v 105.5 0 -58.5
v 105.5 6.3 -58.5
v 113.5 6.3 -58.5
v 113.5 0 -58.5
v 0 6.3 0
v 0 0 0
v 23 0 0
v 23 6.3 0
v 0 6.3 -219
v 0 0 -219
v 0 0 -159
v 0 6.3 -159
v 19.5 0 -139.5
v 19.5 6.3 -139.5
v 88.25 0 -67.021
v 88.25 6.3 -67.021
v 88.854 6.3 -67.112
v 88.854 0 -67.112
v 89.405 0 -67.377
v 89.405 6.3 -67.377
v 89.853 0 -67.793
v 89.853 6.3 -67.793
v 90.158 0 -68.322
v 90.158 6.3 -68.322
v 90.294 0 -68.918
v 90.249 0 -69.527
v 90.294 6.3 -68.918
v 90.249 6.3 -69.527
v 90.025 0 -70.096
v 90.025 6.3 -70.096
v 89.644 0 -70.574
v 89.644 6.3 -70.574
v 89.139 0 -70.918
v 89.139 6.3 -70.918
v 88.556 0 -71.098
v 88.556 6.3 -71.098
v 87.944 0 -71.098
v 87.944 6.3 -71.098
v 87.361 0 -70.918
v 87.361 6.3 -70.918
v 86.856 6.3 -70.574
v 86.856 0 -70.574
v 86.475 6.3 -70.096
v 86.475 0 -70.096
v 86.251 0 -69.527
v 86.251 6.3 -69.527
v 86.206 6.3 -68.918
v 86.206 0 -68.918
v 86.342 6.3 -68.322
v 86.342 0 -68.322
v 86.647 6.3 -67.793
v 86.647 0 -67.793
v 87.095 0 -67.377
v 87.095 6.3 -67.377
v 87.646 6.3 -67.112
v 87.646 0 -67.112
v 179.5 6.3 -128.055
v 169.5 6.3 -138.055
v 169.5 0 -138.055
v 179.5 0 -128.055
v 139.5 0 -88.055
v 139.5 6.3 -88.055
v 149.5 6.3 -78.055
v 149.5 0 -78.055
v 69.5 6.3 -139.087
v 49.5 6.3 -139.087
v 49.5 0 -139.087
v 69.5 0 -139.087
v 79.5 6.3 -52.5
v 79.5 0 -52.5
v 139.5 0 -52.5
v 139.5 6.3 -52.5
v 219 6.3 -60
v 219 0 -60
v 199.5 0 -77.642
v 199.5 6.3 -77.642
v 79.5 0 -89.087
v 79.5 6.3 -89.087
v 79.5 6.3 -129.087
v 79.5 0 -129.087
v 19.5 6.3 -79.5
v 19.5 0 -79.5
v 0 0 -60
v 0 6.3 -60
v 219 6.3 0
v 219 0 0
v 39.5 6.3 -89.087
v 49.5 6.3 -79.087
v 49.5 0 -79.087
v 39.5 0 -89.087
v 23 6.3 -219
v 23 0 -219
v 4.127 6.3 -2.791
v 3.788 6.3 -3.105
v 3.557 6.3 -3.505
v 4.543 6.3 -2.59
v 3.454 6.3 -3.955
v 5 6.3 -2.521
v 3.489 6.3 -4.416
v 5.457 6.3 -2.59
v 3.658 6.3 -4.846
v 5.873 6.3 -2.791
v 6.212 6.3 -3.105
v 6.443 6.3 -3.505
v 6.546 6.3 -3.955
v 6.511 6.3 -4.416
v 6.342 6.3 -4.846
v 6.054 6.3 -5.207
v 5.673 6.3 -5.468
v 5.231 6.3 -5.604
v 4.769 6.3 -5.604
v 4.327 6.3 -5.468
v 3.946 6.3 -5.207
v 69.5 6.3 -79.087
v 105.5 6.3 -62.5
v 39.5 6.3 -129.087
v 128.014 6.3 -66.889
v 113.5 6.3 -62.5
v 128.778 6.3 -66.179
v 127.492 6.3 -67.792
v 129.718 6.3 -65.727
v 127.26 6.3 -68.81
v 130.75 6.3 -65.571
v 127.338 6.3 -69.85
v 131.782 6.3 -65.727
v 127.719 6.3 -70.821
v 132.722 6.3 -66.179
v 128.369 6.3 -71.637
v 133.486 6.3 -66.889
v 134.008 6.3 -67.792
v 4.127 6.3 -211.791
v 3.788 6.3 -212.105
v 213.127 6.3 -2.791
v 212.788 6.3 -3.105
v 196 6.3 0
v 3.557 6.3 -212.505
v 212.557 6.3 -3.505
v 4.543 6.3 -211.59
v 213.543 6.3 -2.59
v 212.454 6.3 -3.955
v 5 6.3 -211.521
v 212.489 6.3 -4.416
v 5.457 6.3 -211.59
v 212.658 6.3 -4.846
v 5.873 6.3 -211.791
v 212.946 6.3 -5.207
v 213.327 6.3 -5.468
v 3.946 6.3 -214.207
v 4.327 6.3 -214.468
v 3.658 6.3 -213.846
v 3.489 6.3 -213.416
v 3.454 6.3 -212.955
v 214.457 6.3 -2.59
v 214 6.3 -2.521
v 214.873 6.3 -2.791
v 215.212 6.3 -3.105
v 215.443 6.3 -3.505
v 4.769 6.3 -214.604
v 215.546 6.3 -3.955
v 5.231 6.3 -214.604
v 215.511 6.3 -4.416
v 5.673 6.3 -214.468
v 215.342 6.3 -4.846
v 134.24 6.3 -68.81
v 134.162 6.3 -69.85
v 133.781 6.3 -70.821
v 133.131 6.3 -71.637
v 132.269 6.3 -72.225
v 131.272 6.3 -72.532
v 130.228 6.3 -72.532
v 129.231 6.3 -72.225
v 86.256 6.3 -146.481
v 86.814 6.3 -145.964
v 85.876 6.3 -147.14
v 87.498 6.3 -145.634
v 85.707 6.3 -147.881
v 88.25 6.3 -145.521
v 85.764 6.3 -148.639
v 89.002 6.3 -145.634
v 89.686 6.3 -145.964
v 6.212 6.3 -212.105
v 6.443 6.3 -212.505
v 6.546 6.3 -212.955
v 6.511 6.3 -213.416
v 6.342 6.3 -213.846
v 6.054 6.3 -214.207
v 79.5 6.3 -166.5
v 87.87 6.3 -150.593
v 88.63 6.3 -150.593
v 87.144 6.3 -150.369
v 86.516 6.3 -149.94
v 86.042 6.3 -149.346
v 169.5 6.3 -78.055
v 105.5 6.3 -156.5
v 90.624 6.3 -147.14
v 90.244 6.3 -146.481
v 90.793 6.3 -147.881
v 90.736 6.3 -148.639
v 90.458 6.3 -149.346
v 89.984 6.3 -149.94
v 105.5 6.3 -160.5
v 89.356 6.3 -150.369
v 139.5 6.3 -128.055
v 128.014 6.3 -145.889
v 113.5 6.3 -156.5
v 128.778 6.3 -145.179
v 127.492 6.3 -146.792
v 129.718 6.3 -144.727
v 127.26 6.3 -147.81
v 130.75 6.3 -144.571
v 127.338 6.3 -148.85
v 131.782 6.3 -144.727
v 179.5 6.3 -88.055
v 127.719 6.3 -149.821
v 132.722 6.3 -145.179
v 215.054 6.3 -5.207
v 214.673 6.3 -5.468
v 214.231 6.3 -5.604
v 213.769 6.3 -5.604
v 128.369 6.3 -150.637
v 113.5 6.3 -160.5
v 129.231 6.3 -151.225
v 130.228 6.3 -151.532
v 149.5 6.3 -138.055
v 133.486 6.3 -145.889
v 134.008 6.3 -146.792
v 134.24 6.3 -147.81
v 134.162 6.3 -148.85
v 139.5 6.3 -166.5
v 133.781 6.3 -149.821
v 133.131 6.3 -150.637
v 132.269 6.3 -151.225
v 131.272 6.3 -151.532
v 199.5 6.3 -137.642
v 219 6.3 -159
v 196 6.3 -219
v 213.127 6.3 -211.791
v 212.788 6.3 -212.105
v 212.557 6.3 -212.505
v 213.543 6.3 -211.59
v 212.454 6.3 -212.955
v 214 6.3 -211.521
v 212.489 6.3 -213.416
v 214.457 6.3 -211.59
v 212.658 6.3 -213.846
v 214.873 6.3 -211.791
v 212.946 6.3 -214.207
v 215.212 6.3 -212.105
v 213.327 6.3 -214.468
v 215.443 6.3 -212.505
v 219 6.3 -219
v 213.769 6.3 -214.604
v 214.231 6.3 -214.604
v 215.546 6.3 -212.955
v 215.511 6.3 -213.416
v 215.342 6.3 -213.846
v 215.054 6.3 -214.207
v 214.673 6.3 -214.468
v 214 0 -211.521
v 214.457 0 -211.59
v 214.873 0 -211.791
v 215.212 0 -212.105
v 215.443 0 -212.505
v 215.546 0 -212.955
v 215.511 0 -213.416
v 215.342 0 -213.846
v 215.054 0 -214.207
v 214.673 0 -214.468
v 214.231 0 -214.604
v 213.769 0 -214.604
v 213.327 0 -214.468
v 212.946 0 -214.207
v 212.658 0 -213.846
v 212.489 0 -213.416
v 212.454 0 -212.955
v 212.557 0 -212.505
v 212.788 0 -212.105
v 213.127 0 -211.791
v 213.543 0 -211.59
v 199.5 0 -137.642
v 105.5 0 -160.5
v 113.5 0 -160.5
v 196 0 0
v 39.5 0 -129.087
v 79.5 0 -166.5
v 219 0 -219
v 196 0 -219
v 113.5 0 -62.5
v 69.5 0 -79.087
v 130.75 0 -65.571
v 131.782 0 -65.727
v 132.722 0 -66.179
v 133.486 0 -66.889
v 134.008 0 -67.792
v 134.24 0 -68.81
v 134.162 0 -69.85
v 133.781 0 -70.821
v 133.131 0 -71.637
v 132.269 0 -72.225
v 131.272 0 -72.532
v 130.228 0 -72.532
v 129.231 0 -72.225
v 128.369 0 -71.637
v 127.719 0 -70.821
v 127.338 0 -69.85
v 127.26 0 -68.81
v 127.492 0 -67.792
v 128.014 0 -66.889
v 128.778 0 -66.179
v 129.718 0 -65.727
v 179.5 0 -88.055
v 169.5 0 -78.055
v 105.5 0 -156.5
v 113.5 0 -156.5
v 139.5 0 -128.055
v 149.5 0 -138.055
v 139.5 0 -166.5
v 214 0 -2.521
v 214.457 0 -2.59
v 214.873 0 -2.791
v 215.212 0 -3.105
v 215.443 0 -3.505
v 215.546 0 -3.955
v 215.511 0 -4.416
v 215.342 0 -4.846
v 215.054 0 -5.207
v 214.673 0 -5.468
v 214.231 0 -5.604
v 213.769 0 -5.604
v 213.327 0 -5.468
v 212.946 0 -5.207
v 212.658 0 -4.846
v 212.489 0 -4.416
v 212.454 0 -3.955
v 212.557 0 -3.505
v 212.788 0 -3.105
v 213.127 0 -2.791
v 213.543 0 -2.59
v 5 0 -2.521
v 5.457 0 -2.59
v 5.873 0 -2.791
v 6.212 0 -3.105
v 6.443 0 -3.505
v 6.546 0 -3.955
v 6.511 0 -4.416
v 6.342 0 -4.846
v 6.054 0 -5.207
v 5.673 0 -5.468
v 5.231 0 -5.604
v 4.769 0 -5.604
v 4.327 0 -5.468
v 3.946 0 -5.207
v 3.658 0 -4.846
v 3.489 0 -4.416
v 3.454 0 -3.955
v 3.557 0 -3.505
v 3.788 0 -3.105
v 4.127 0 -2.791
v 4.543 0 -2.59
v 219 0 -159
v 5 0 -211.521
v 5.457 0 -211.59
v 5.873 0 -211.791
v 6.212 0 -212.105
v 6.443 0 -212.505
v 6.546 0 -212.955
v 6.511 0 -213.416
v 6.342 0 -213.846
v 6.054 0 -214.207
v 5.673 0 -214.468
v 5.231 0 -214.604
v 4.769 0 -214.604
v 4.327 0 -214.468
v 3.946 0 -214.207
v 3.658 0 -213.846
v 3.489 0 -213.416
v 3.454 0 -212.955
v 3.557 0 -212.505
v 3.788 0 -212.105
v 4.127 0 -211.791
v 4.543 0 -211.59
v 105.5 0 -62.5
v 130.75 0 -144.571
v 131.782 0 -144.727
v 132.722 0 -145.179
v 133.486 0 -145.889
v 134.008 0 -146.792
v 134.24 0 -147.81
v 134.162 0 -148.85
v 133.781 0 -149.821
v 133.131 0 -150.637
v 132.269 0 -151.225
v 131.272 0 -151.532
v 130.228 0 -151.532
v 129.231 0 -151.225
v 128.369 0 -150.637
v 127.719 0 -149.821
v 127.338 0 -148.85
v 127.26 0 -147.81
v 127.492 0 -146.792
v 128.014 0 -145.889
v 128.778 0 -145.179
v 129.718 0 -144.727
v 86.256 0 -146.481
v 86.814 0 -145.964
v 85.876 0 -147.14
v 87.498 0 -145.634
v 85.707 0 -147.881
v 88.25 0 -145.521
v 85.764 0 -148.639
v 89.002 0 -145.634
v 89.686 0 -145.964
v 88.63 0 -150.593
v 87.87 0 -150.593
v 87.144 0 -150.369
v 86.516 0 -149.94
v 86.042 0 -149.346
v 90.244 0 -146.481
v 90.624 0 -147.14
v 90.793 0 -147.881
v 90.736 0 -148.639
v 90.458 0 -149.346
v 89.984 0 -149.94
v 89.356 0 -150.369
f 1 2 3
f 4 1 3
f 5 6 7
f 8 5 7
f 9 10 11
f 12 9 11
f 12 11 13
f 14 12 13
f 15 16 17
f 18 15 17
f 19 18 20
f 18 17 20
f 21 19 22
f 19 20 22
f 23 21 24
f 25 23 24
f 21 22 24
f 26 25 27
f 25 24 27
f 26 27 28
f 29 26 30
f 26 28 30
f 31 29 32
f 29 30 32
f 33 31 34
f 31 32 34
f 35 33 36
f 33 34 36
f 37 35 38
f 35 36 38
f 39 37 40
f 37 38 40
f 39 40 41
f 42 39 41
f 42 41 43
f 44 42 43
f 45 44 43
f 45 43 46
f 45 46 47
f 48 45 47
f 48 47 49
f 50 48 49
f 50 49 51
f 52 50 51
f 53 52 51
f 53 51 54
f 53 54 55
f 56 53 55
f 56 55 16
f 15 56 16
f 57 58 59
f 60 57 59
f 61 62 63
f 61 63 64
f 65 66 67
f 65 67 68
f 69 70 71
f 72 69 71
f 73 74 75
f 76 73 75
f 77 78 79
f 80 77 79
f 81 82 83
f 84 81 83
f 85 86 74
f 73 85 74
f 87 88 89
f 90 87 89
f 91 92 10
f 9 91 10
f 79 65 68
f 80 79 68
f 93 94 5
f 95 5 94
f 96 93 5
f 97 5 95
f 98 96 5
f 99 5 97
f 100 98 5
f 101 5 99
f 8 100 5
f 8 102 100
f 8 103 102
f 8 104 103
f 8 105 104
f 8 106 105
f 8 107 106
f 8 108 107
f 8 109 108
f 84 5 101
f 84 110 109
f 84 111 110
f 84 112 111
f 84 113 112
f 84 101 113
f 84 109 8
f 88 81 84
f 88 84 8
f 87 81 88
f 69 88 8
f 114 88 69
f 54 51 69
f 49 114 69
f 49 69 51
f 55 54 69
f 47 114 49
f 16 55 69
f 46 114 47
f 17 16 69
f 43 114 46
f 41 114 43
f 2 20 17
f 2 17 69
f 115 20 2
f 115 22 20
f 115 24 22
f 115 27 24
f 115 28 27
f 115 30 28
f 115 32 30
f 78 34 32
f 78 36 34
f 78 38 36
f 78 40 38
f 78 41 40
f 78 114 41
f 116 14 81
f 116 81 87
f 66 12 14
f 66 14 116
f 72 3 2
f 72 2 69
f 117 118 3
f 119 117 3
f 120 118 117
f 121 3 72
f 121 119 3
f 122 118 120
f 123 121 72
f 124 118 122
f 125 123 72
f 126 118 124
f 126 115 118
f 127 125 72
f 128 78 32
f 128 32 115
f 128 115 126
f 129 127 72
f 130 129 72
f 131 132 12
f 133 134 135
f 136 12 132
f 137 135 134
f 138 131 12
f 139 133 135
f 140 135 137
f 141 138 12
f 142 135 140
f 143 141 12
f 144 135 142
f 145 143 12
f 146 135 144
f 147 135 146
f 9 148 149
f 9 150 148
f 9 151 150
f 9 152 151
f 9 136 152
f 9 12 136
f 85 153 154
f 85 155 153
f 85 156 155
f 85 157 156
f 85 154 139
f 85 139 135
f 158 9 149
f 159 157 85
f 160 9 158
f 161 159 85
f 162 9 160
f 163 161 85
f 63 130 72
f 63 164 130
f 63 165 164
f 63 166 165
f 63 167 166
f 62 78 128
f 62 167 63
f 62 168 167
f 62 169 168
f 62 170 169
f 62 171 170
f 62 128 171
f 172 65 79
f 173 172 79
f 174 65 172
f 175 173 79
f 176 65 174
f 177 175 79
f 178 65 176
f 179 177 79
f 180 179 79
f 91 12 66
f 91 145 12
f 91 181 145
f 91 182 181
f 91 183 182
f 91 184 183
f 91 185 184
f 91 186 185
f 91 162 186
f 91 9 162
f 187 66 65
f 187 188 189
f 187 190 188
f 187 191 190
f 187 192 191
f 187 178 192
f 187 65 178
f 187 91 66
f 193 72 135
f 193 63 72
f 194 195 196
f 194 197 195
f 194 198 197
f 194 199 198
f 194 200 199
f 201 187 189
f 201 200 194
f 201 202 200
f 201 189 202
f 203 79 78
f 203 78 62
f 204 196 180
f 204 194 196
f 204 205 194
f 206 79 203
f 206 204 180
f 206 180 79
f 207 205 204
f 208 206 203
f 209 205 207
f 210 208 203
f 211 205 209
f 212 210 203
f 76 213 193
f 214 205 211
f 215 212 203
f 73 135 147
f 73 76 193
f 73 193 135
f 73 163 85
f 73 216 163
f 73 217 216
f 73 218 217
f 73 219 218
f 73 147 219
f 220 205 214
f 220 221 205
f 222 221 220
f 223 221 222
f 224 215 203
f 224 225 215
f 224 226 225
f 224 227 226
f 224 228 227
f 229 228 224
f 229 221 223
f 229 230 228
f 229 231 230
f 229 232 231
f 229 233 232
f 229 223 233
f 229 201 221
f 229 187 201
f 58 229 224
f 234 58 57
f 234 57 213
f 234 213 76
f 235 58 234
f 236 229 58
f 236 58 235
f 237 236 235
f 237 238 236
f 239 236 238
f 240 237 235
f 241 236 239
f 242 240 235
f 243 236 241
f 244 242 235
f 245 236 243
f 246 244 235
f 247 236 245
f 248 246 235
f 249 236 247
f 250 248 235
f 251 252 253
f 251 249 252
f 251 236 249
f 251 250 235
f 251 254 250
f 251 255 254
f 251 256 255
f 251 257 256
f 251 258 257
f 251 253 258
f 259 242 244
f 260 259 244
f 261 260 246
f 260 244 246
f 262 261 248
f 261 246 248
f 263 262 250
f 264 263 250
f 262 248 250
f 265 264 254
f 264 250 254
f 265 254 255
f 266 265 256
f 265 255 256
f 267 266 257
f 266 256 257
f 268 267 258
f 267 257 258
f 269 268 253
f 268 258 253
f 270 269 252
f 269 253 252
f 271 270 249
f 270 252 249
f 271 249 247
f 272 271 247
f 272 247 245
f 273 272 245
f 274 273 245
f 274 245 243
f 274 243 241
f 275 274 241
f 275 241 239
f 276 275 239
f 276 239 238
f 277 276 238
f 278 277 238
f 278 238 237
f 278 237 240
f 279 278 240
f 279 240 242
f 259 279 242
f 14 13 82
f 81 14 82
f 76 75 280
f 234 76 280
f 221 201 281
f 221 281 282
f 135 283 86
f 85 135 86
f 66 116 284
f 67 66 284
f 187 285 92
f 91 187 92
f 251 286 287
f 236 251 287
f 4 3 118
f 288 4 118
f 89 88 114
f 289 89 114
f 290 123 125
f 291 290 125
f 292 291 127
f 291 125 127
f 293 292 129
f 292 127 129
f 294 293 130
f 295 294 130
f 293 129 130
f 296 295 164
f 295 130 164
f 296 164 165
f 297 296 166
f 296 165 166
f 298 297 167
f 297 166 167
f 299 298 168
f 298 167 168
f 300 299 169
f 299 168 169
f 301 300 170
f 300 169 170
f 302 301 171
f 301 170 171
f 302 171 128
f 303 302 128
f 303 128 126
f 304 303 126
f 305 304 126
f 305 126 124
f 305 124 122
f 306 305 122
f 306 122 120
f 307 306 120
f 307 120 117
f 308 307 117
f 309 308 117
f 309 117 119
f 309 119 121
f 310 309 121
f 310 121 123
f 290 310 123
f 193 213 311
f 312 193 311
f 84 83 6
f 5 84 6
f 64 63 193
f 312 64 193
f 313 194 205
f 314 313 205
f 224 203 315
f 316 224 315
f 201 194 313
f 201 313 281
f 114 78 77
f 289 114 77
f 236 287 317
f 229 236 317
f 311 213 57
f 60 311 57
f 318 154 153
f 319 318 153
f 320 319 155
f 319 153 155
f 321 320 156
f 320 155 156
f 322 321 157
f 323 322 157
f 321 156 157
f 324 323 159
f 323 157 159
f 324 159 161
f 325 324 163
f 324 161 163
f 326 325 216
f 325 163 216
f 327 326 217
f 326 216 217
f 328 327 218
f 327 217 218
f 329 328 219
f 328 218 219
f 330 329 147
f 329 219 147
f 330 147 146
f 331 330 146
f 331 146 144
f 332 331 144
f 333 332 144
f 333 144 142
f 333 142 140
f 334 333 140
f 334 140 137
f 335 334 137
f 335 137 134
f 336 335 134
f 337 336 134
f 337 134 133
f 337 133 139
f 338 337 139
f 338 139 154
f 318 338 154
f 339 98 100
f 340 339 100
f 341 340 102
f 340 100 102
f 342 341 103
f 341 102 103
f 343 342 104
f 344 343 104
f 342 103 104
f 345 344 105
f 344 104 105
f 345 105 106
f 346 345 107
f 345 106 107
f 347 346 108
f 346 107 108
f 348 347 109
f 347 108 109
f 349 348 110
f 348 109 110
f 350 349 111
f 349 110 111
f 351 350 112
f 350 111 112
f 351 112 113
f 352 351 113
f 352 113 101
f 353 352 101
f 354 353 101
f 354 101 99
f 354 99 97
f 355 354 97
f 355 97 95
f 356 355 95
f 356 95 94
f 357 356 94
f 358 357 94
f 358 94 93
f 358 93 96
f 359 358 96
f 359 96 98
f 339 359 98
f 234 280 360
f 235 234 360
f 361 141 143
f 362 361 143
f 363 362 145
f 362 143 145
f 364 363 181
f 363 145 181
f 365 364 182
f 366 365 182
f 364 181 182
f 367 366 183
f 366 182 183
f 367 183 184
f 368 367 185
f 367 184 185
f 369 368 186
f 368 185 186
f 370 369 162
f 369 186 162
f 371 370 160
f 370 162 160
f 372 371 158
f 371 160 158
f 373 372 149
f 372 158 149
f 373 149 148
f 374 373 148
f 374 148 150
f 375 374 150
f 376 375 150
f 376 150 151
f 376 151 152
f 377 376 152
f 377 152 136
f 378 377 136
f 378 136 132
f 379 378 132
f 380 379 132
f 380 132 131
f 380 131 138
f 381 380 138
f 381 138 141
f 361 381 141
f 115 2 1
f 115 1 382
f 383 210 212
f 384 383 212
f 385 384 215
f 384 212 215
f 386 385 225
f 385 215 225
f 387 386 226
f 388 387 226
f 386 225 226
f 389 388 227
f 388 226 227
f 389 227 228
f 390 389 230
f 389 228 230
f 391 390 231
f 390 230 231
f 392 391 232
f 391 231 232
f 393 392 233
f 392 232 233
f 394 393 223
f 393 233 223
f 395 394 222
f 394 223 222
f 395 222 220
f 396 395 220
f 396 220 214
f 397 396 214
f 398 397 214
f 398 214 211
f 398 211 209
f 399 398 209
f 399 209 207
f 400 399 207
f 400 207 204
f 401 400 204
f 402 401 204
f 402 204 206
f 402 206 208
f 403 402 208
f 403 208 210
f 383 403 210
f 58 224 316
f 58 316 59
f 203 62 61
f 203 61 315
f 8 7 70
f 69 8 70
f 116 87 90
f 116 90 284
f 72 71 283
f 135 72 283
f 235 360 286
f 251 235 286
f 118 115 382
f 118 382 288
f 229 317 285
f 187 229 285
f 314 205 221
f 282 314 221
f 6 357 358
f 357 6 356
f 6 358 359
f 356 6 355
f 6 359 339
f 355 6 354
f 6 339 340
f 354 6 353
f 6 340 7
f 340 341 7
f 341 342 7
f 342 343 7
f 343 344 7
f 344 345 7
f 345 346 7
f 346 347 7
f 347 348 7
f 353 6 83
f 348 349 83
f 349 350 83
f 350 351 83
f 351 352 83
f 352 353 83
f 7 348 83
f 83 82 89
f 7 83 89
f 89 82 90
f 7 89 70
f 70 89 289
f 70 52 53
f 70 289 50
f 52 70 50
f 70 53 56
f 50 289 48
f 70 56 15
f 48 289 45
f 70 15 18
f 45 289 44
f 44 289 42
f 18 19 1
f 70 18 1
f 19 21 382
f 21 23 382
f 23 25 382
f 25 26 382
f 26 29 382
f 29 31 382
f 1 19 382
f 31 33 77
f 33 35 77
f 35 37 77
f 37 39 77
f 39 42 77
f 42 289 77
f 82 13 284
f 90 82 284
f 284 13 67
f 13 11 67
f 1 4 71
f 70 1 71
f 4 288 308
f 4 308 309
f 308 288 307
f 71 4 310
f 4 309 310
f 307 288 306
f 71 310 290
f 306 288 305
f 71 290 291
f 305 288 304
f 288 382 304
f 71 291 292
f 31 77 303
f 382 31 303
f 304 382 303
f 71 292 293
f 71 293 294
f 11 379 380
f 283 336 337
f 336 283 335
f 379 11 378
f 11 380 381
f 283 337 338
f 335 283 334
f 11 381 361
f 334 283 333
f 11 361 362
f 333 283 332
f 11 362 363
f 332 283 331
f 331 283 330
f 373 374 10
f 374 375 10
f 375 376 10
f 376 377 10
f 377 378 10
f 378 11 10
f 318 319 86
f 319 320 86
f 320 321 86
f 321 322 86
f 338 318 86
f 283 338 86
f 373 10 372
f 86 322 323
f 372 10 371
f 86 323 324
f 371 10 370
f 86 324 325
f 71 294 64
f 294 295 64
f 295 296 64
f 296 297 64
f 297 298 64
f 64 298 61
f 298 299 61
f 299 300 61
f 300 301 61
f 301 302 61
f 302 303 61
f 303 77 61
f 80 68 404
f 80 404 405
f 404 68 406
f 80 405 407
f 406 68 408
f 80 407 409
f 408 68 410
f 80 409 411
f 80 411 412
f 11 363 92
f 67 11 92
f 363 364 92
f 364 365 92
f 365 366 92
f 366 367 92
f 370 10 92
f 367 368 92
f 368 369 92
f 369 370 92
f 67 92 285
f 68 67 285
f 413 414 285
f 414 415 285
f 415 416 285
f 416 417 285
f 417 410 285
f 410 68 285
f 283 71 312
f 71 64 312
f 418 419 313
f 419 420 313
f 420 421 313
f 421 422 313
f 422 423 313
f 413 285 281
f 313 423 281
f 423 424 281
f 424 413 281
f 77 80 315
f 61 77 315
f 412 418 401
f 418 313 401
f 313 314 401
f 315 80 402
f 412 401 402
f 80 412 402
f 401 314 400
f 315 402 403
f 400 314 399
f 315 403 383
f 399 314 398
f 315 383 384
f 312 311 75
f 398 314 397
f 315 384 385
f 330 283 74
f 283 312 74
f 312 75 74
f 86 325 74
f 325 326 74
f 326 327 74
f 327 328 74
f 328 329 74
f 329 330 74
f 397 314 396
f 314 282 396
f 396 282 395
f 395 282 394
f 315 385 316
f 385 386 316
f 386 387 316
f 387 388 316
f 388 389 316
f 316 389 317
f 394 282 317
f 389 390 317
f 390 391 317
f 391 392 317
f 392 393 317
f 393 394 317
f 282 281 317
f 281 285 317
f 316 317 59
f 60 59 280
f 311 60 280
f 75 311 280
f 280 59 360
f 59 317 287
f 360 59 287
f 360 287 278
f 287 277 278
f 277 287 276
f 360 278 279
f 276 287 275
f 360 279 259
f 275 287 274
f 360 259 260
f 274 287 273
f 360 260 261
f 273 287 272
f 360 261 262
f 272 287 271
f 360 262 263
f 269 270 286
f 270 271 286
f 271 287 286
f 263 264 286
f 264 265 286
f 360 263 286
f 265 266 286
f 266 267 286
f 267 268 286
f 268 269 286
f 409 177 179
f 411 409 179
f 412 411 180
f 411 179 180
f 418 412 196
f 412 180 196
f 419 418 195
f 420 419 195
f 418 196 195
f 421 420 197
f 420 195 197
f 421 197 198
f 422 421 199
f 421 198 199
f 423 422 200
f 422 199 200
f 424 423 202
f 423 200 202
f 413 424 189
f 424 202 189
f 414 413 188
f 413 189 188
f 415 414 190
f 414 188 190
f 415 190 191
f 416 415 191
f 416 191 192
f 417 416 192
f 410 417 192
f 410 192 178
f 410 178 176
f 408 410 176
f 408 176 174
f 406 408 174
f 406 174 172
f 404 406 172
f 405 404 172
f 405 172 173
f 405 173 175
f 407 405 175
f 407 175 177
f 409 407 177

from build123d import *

# Parameters (mm, degrees)
BOSS_EXTRUDE1_DEPTH = 6.3
SKETCH3_W           = 8
SKETCH3_H           = 4
SKETCH3_W_2         = 40
SKETCH3_H_2         = 60
CUT_EXTRUDE1_DEPTH  = 310.776839031
CHAMFER1_SIZE       = 10
SKETCH4_R           = 1.55
SKETCH4_R_2         = 2.55
SKETCH4_R_3         = 2.05
SKETCH4_R_4         = 3.5
CUT_EXTRUDE2_DEPTH  = 310.776839031


with BuildPart() as part:
    # Sketch1 → Boss-Extrude1 (new body)
    with BuildSketch(Plane(origin=(0, 0, 0), x_dir=(1, 0, 0), z_dir=(0, 1, 0))):
        Polygon((0, 0), (23, 0), (79.5, 52.5), (139.5, 52.5), (196, 0), (219, 0), (219, 60), (199.5, 77.642351694), (199.5, 137.642351694), (219, 159), (219, 219), (196, 219), (139.5, 166.5), (79.5, 166.5), (23, 219), (0, 219), (0, 159), (19.5, 139.5), (19.5, 79.5), (0, 60), align=None)
    extrude(amount=BOSS_EXTRUDE1_DEPTH)

    # Sketch3 → Cut-Extrude1 (cut, through all)
    with BuildSketch(Plane(origin=(0, 6.3, 0), x_dir=(1, 0, 0), z_dir=(0, 1, 0))):
        with Locations((109.5, 158.5)):
            Rectangle(SKETCH3_W, SKETCH3_H)
        with Locations((109.5, 60.5)):
            Rectangle(SKETCH3_W, SKETCH3_H)
        with Locations((59.5, 109.087189265)):
            Rectangle(SKETCH3_W_2, SKETCH3_H_2)
        with Locations((159.5, 108.055162429)):
            Rectangle(SKETCH3_W_2, SKETCH3_H_2)
    extrude(amount=-CUT_EXTRUDE1_DEPTH, mode=Mode.SUBTRACT)

    # Chamfer1
    chamfer1_edges = [part.edges().sort_by_distance(p)[0] for p in [
        (79.5, 3.15, -139.087189265),
        (79.5, 3.15, -79.087189265),
        (39.5, 3.15, -79.087189265),
        (39.5, 3.15, -139.087189265),
        (179.5, 3.15, -138.055162429),
        (179.5, 3.15, -78.055162429),
        (139.5, 3.15, -78.055162429),
        (139.5, 3.15, -138.055162429),
    ]]
    chamfer(chamfer1_edges, length=CHAMFER1_SIZE)

    # Sketch4 → Cut-Extrude2 (cut, through all)
    with BuildSketch(Plane(origin=(0, 6.3, 0), x_dir=(1, 0, 0), z_dir=(0, 1, 0))):
        with Locations(Location((5, 213.071175847, 0), (0, 0, 270))):
            Circle(SKETCH4_R)
        with Locations(Location((214, 213.071175847, 0), (0, 0, 270))):
            Circle(SKETCH4_R)
        with Locations(Location((214, 4.071175847, 0), (0, 0, 270))):
            Circle(SKETCH4_R)
        with Locations(Location((5, 4.071175847, 0), (0, 0, 270))):
            Circle(SKETCH4_R)
        with Locations(Location((88.25, 148.071175847, 0), (0, 0, 270))):
            Circle(SKETCH4_R_2)
        with Locations(Location((88.25, 69.071175847, 0), (0, 0, 270))):
            Circle(SKETCH4_R_3)
        with Locations(Location((130.75, 69.071175847, 0), (0, 0, 270))):
            Circle(SKETCH4_R_4)
        with Locations(Location((130.75, 148.071175847, 0), (0, 0, 270))):
            Circle(SKETCH4_R_4)
    extrude(amount=-CUT_EXTRUDE2_DEPTH, mode=Mode.SUBTRACT)


solid = part.part
